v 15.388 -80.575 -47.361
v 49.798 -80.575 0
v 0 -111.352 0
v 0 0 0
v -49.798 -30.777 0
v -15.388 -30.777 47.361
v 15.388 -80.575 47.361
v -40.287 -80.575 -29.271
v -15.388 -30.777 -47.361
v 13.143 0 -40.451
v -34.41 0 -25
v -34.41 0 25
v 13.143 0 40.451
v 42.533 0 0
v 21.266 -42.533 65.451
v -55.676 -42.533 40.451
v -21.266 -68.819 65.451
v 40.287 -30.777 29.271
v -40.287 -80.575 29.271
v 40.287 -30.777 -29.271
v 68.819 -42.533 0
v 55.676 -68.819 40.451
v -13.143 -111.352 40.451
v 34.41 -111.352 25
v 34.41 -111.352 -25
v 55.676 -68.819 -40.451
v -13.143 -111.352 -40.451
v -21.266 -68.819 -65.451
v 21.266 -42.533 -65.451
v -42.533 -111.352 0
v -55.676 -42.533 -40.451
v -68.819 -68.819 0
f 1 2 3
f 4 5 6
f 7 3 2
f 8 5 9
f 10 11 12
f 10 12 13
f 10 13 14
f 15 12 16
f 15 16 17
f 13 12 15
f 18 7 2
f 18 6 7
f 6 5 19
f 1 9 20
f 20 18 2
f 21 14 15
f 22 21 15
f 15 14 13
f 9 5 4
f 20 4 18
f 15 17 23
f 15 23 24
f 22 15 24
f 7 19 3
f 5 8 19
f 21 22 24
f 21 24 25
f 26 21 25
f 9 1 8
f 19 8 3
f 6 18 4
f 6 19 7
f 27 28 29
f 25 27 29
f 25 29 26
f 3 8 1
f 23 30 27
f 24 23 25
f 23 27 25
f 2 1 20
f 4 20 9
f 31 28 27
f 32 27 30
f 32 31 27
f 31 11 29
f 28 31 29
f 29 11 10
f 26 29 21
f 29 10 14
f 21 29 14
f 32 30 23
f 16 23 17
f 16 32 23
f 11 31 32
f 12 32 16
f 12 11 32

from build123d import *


with BuildPart() as body_1:
    # Skizze1 → Oberfläche-Ebene1: a flat surface bounded by the sketch
    with BuildSketch(Plane(origin=(0, 0, 0), x_dir=(1, 0, 0), z_dir=(0, 1, 0)), mode=Mode.PRIVATE) as oberfl_che_ebene1_1_region:
        Polygon((42.532540418, 0), (13.143277803, 40.450849719), (-34.409548012, 25), (-34.409548012, -25), (13.143277803, -40.450849719), align=None)
    oberfl_che_ebene1_1 = oberfl_che_ebene1_1_region.sketch.faces()[0]
    # Skizze2 → Oberfläche-Ebene2: a flat surface bounded by the sketch
    with BuildSketch(Plane(origin=(22.270327288, 13.763819205, -16.180339887), x_dir=(0.447213595, 0.276393202, 0.850650808), z_dir=(-0.723606798, -0.447213595, 0.525731112)), mode=Mode.PRIVATE) as oberfl_che_ebene2_2_region:
        Polygon((19.021130326, -22.360679775), (-28.531695489, -6.909830056), (-57.920958103, -47.360679775), (-28.531695489, -87.811529494), (19.021130326, -72.360679775), align=None)
    oberfl_che_ebene2_2 = oberfl_che_ebene2_2_region.sketch.faces()[0]
    # Skizze3 → Oberfläche-Ebene3: a flat surface bounded by the sketch
    with BuildSketch(Plane(origin=(22.270327288, 13.763819205, 16.180339887), x_dir=(-0.447213595, -0.276393202, 0.850650808), z_dir=(-0.723606798, -0.447213595, -0.525731112)), mode=Mode.PRIVATE) as oberfl_che_ebene3_3_region:
        Polygon((-19.021130326, -22.360679775), (-19.021130326, -72.360679775), (28.531695489, -87.811529494), (57.920958103, -47.360679775), (28.531695489, -6.909830056), align=None)
    oberfl_che_ebene3_3 = oberfl_che_ebene3_3_region.sketch.faces()[0]
    # Skizze4 → Oberfläche-Ebene4: a flat surface bounded by the sketch
    with BuildSketch(Plane(origin=(-8.506508084, 13.763819205, 26.180339887), x_dir=(-0.961044639, -0.128617124, -0.244644308), z_dir=(0.276393202, -0.447213595, -0.850650808)), mode=Mode.PRIVATE) as oberfl_che_ebene4_4_region:
        Polygon((13.27697134, -91.370916552), (-30.979599792, -68.103860192), (-22.527346819, -18.823444004), (26.953003932, -11.63352818), (49.081289498, -56.470332012), align=None)
    oberfl_che_ebene4_4 = oberfl_che_ebene4_4_region.sketch.faces()[0]
    # Skizze5 → Oberfläche-Ebene5: a flat surface bounded by the sketch
    with BuildSketch(Plane(origin=(-27.527638409, 13.763819205, 0), x_dir=(0, 0, -1), z_dir=(0.894427191, -0.447213595, 0)), mode=Mode.PRIVATE) as oberfl_che_ebene5_5_region:
        Polygon((40.450849719, -62.941243501), (0, -92.330506115), (-40.450849719, -62.941243501), (-25, -15.388417686), (25, -15.388417686), align=None)
    oberfl_che_ebene5_5 = oberfl_che_ebene5_5_region.sketch.faces()[0]
    # Skizze6 → Oberfläche-Ebene6: a flat surface bounded by the sketch
    with BuildSketch(Plane(origin=(-8.506508084, 13.763819205, -26.180339887), x_dir=(0.961044639, 0.128617124, -0.244644308), z_dir=(0.276393202, -0.447213595, 0.850650808)), mode=Mode.PRIVATE) as oberfl_che_ebene6_6_region:
        Polygon((-26.953003932, -11.63352818), (-49.081289498, -56.470332012), (-13.27697134, -91.370916552), (30.979599792, -68.103860192), (22.527346819, -18.823444004), align=None)
    oberfl_che_ebene6_6 = oberfl_che_ebene6_6_region.sketch.faces()[0]
    # Skizze7 → Oberfläche-Ebene7: a flat surface bounded by the sketch
    with BuildSketch(Plane(origin=(22.270327288, -36.034146493, 68.541019662), x_dir=(-0.961044639, -0.128617124, 0.244644308), z_dir=(-0.276393202, 0.447213595, -0.850650808)), mode=Mode.PRIVATE) as oberfl_che_ebene7_7_region:
        Polygon((45.301327056, -30.456972184), (36.849074082, -79.737388372), (-12.631276669, -86.927304196), (-34.759562235, -42.090500364), (1.044755924, -7.189915824), align=None)
    oberfl_che_ebene7_7 = oberfl_che_ebene7_7_region.sketch.faces()[0]
    # Skizze8 → Oberfläche-Ebene8: a flat surface bounded by the sketch
    with BuildSketch(Plane(origin=(-58.304473781, -36.034146493, 42.360679775), x_dir=(-0.447213595, -0.276393202, -0.850650808), z_dir=(0.723606798, 0.447213595, -0.525731112)), mode=Mode.PRIVATE) as oberfl_che_ebene8_8_region:
        Polygon((49.797965698, -72.360679775), (2.245139883, -87.811529494), (-27.144122732, -47.360679775), (2.245139883, -6.909830056), (49.797965698, -22.360679775), align=None)
    oberfl_che_ebene8_8 = oberfl_che_ebene8_8_region.sketch.faces()[0]
    # Skizze9 → Oberfläche-Ebene9: a flat surface bounded by the sketch
    with BuildSketch(Plane(origin=(-58.304473781, -36.034146493, -42.360679775), x_dir=(0.447213595, 0.276393202, -0.850650808), z_dir=(0.723606798, 0.447213595, 0.525731112)), mode=Mode.PRIVATE) as oberfl_che_ebene9_9_region:
        Polygon((27.144122732, -47.360679775), (-2.245139883, -87.811529494), (-49.797965698, -72.360679775), (-49.797965698, -22.360679775), (-2.245139883, -6.909830056), align=None)
    oberfl_che_ebene9_9 = oberfl_che_ebene9_9_region.sketch.faces()[0]
    # Skizze10 → Oberfläche-Ebene10: a flat surface bounded by the sketch
    with BuildSketch(Plane(origin=(22.270327288, -36.034146493, -68.541019662), x_dir=(-0.961044639, -0.128617124, -0.244644308), z_dir=(0.276393202, -0.447213595, -0.850650808)), mode=Mode.PRIVATE) as oberfl_che_ebene10_10_region:
        Polygon((-12.631276669, -86.927304196), (-34.759562235, -42.090500364), (1.044755924, -7.189915824), (45.301327056, -30.456972184), (36.849074082, -79.737388372), align=None)
    oberfl_che_ebene10_10 = oberfl_che_ebene10_10_region.sketch.faces()[0]
    # Skizze11 → Oberfläche-Ebene11: a flat surface bounded by the sketch
    with BuildSketch(Plane(origin=(72.068292986, -36.034146493, 0), x_dir=(0, 0, -1), z_dir=(0.894427191, -0.447213595, 0)), mode=Mode.PRIVATE) as oberfl_che_ebene11_11_region:
        Polygon((-40.450849719, -36.654687895), (-25, -84.207513709), (25, -84.207513709), (40.450849719, -36.654687895), (0, -7.26542528), align=None)
    oberfl_che_ebene11_11 = oberfl_che_ebene11_11_region.sketch.faces()[0]
    # Skizze12 → Oberfläche-Ebene12: a flat surface bounded by the sketch
    with BuildSketch(Plane(origin=(0, -111.351636441, 0), x_dir=(1, 0, 0), z_dir=(0, 1, 0)), mode=Mode.PRIVATE) as oberfl_che_ebene12_12_region:
        Polygon((-13.143277803, -40.450849719), (34.409548012, -25), (34.409548012, 25), (-13.143277803, 40.450849719), (-42.532540418, 0), align=None)
    oberfl_che_ebene12_12 = oberfl_che_ebene12_12_region.sketch.faces()[0]
    # Oberfläche-Zusammenfügen1: the surfaces knitted into a closed skin and filled: a solid
    add(Solid(Shell(Face.sew_faces(oberfl_che_ebene1_1.faces() + oberfl_che_ebene2_2.faces() + oberfl_che_ebene3_3.faces() + oberfl_che_ebene4_4.faces() + oberfl_che_ebene5_5.faces() + oberfl_che_ebene6_6.faces() + oberfl_che_ebene7_7.faces() + oberfl_che_ebene8_8.faces() + oberfl_che_ebene9_9.faces() + oberfl_che_ebene10_10.faces() + oberfl_che_ebene11_11.faces() + oberfl_che_ebene12_12.faces())[0])))


with BuildPart() as body_2:
    # Skizze-y1 → Oberfläche-Ebene-y1: a flat surface bounded by the sketch
    with BuildSketch(Plane(origin=(0, 0, 0), x_dir=(0.982246946, -0.1517655, -0.11026409), z_dir=(0.187592474, 0.794654472, 0.577350269)), mode=Mode.PRIVATE) as oberfl_che_ebene_y1_13_region:
        Polygon((41.015551826, -41.770509831), (-15.66654673, -56.405764747), (0, 0), align=None)
    oberfl_che_ebene_y1_13 = oberfl_che_ebene_y1_13_region.sketch.faces()[0]
    # Skizze-y2 → Oberfläche-Ebene-y2: a flat surface bounded by the sketch
    with BuildSketch(Plane(origin=(0, 0, 0), x_dir=(0.871089969, 0.448028881, 0.201177502), z_dir=(-0.491123473, 0.794654472, 0.35682209)), mode=Mode.PRIVATE) as oberfl_che_ebene_y2_14_region:
        Polygon((-17.665704156, -55.811951048), (0, 0), (-57.167419521, -12.607026949), align=None)
    oberfl_che_ebene_y2_14 = oberfl_che_ebene_y2_14_region.sketch.faces()[0]
    # Skizze-y3 → Oberfläche-Ebene-y3: a flat surface bounded by the sketch
    with BuildSketch(Plane(origin=(0, 0, 0), x_dir=(0.871089969, 0.448028881, -0.201177502), z_dir=(-0.491123473, 0.794654472, -0.35682209)), mode=Mode.PRIVATE) as oberfl_che_ebene_y3_15_region:
        Polygon((-57.167419521, 12.607026949), (0, 0), (-17.665704156, 55.811951048), align=None)
    oberfl_che_ebene_y3_15 = oberfl_che_ebene_y3_15_region.sketch.faces()[0]
    # Skizze-y4 → Oberfläche-Ebene-y4: a flat surface bounded by the sketch
    with BuildSketch(Plane(origin=(0, 0, 0), x_dir=(0.982246946, -0.1517655, 0.11026409), z_dir=(0.187592474, 0.794654472, -0.577350269)), mode=Mode.PRIVATE) as oberfl_che_ebene_y4_16_region:
        Polygon((41.015551826, 41.770509831), (0, 0), (-15.66654673, 56.405764747), align=None)
    oberfl_che_ebene_y4_16 = oberfl_che_ebene_y4_16_region.sketch.faces()[0]
    # Skizze-y5 → Oberfläche-Ebene-y5: a flat surface bounded by the sketch
    with BuildSketch(Plane(origin=(0, 0, 0), x_dir=(0.794654472, -0.607061998, 0), z_dir=(0.607061998, 0.794654472, 0)), mode=Mode.PRIVATE) as oberfl_che_ebene_y5_17_region:
        Polygon((0, 0), (50.698010191, -29.270509831), (50.698010191, 29.270509831), align=None)
    oberfl_che_ebene_y5_17 = oberfl_che_ebene_y5_17_region.sketch.faces()[0]
    # Skizze-y6 → Oberfläche-Ebene-y6: a flat surface bounded by the sketch
    with BuildSketch(Plane(origin=(10.258945124, 6.340376775, 31.573786517), x_dir=(-0.952821564, 0.05975949, 0.297590105), z_dir=(-0.303530999, -0.187592474, -0.934172359)), mode=Mode.PRIVATE) as oberfl_che_ebene_y6_18_region:
        Polygon((-5.383455577, -88.322160488), (-31.515297879, -35.937259982), (26.917277885, -39.498870954), align=None)
    oberfl_che_ebene_y6_18 = oberfl_che_ebene_y6_18_region.sketch.faces()[0]
    # Skizze-y7 → Oberfläche-Ebene-y7: a flat surface bounded by the sketch
    with BuildSketch(Plane(origin=(-16.599321899, -10.258945124, 51.087459737), x_dir=(-0.952821564, 0.05975949, -0.297590105), z_dir=(0.303530999, 0.187592474, -0.934172359)), mode=Mode.PRIVATE) as oberfl_che_ebene_y7_19_region:
        Polygon((-33.571594932, -69.673323329), (-1.27086147, -20.850033795), (24.860980832, -73.234934301), align=None)
    oberfl_che_ebene_y7_19 = oberfl_che_ebene_y7_19_region.sketch.faces()[0]
    # Skizze-y8 → Oberfläche-Ebene-y8: a flat surface bounded by the sketch
    with BuildSketch(Plane(origin=(-26.858267023, 6.340376775, 19.513673221), x_dir=(0.561905566, -0.132647911, 0.816496581), z_dir=(-0.794654472, 0.187592474, 0.577350269)), mode=Mode.PRIVATE) as oberfl_che_ebene_y8_20_region:
        Polygon((11.9496356, -87.675491651), (34.105478461, -33.489057831), (-23.899271199, -41.394751981), align=None)
    oberfl_che_ebene_y8_20 = oberfl_che_ebene_y8_20_region.sketch.faces()[0]
    # Skizze-y9 → Oberfläche-Ebene-y9: a flat surface bounded by the sketch
    with BuildSketch(Plane(origin=(-53.716534046, -10.258945124, 0), x_dir=(0, 0, 1), z_dir=(-0.982246946, -0.187592474, 0)), mode=Mode.PRIVATE) as oberfl_che_ebene_y9_21_region:
        Polygon((-29.270509831, -71.586739165), (29.270509831, -71.586739165), (0, -20.888728973), align=None)
    oberfl_che_ebene_y9_21 = oberfl_che_ebene_y9_21_region.sketch.faces()[0]
    # Skizze-y10 → Oberfläche-Ebene-y10: a flat surface bounded by the sketch
    with BuildSketch(Plane(origin=(-26.858267023, 6.340376775, -19.513673221), x_dir=(0.561905566, -0.132647911, -0.816496581), z_dir=(0.794654472, -0.187592474, 0.577350269)), mode=Mode.PRIVATE) as oberfl_che_ebene_y10_22_region:
        Polygon((-23.899271199, -41.394751981), (11.9496356, -87.675491651), (34.105478461, -33.489057831), align=None)
    oberfl_che_ebene_y10_22 = oberfl_che_ebene_y10_22_region.sketch.faces()[0]
    # Skizze-y11 → Oberfläche-Ebene-y11: a flat surface bounded by the sketch
    with BuildSketch(Plane(origin=(-16.599321899, -10.258945124, -51.087459737), x_dir=(-0.952821564, 0.05975949, 0.297590105), z_dir=(-0.303530999, -0.187592474, -0.934172359)), mode=Mode.PRIVATE) as oberfl_che_ebene_y11_23_region:
        Polygon((-33.571594932, -69.673323329), (24.860980832, -73.234934301), (-1.27086147, -20.850033795), align=None)
    oberfl_che_ebene_y11_23 = oberfl_che_ebene_y11_23_region.sketch.faces()[0]
    # Skizze-y12 → Oberfläche-Ebene-y12: a flat surface bounded by the sketch
    with BuildSketch(Plane(origin=(10.258945124, 6.340376775, -31.573786517), x_dir=(0.952821564, -0.05975949, 0.297590105), z_dir=(-0.303530999, -0.187592474, 0.934172359)), mode=Mode.PRIVATE) as oberfl_che_ebene_y12_24_region:
        Polygon((-26.917277885, -39.498870954), (5.383455577, -88.322160488), (31.515297879, -35.937259982), align=None)
    oberfl_che_ebene_y12_24 = oberfl_che_ebene_y12_24_region.sketch.faces()[0]
    # Skizze-y13 → Oberfläche-Ebene-y13: a flat surface bounded by the sketch
    with BuildSketch(Plane(origin=(43.457588922, -10.258945124, -31.573786517), x_dir=(-0.561905566, 0.132647911, -0.816496581), z_dir=(0.794654472, -0.187592474, -0.577350269)), mode=Mode.PRIVATE) as oberfl_che_ebene_y13_25_region:
        Polygon((19.334916553, -74.883809811), (-38.669833107, -66.978115661), (-2.820926308, -20.69737599), align=None)
    oberfl_che_ebene_y13_25 = oberfl_che_ebene_y13_25_region.sketch.faces()[0]
    # Skizze-y14 → Oberfläche-Ebene-y14: a flat surface bounded by the sketch
    with BuildSketch(Plane(origin=(33.198643798, 6.340376775, 0), x_dir=(0, 0, 1), z_dir=(-0.982246946, -0.187592474, 0)), mode=Mode.PRIVATE) as oberfl_che_ebene_y14_26_region:
        Polygon((0, -88.486075895), (-29.270509831, -37.788065704), (29.270509831, -37.788065704), align=None)
    oberfl_che_ebene_y14_26 = oberfl_che_ebene_y14_26_region.sketch.faces()[0]
    # Skizze-y15 → Oberfläche-Ebene-y15: a flat surface bounded by the sketch
    with BuildSketch(Plane(origin=(43.457588922, -10.258945124, 31.573786517), x_dir=(-0.561905566, 0.132647911, 0.816496581), z_dir=(-0.794654472, 0.187592474, -0.577350269)), mode=Mode.PRIVATE) as oberfl_che_ebene_y15_27_region:
        Polygon((-38.669833107, -66.978115661), (-2.820926308, -20.69737599), (19.334916553, -74.883809811), align=None)
    oberfl_che_ebene_y15_27 = oberfl_che_ebene_y15_27_region.sketch.faces()[0]
    # Skizze-y16 → Oberfläche-Ebene-y16: a flat surface bounded by the sketch
    with BuildSketch(Plane(origin=(-16.599321899, -70.315855945, 51.087459737), x_dir=(0.982246946, -0.1517655, 0.11026409), z_dir=(0.187592474, 0.794654472, -0.577350269)), mode=Mode.PRIVATE) as oberfl_che_ebene_y16_28_region:
        Polygon((32.56588346, 9.045084972), (16.89933673, 65.450849719), (-24.116215095, 23.680339887), align=None)
    oberfl_che_ebene_y16_28 = oberfl_che_ebene_y16_28_region.sketch.faces()[0]
    # Skizze-y17 → Oberfläche-Ebene-y17: a flat surface bounded by the sketch
    with BuildSketch(Plane(origin=(-53.716534046, -70.315855945, 0), x_dir=(0.794654472, -0.607061998, 0), z_dir=(0.607061998, 0.794654472, 0)), mode=Mode.PRIVATE) as oberfl_che_ebene_y17_29_region:
        Polygon((16.89933673, -29.270509831), (67.597346922, 0), (16.89933673, 29.270509831), align=None)
    oberfl_che_ebene_y17_29 = oberfl_che_ebene_y17_29_region.sketch.faces()[0]
    # Skizze-y18 → Oberfläche-Ebene-y18: a flat surface bounded by the sketch
    with BuildSketch(Plane(origin=(-16.599321899, -70.315855945, -51.087459737), x_dir=(-0.982246946, 0.1517655, 0.11026409), z_dir=(-0.187592474, -0.794654472, -0.577350269)), mode=Mode.PRIVATE) as oberfl_che_ebene_y18_30_region:
        Polygon((24.116215095, -23.680339887), (-16.89933673, -65.450849719), (-32.56588346, -9.045084972), align=None)
    oberfl_che_ebene_y18_30 = oberfl_che_ebene_y18_30_region.sketch.faces()[0]
    # Skizze-y19 → Oberfläche-Ebene-y19: a flat surface bounded by the sketch
    with BuildSketch(Plane(origin=(43.457588922, -70.315855945, -31.573786517), x_dir=(-0.871089969, -0.448028881, -0.201177502), z_dir=(0.491123473, -0.794654472, -0.35682209)), mode=Mode.PRIVATE) as oberfl_che_ebene_y19_31_region:
        Polygon((49.888749118, -45.612651998), (32.223044962, 10.19929905), (-7.278670403, -33.005625049), align=None)
    oberfl_che_ebene_y19_31 = oberfl_che_ebene_y19_31_region.sketch.faces()[0]
    # Skizze-y20 → Oberfläche-Ebene-y20: a flat surface bounded by the sketch
    with BuildSketch(Plane(origin=(43.457588922, -70.315855945, 31.573786517), x_dir=(0.871089969, 0.448028881, -0.201177502), z_dir=(-0.491123473, 0.794654472, -0.35682209)), mode=Mode.PRIVATE) as oberfl_che_ebene_y20_32_region:
        Polygon((-32.223044962, -10.19929905), (7.278670403, 33.005625049), (-49.888749118, 45.612651998), align=None)
    oberfl_che_ebene_y20_32 = oberfl_che_ebene_y20_32_region.sketch.faces()[0]
    # Oberfläche-Zusammenfügen2: the surfaces knitted into a closed skin and filled: a solid
    add(Solid(Shell(Face.sew_faces(oberfl_che_ebene_y1_13.faces() + oberfl_che_ebene_y2_14.faces() + oberfl_che_ebene_y3_15.faces() + oberfl_che_ebene_y4_16.faces() + oberfl_che_ebene_y5_17.faces() + oberfl_che_ebene_y6_18.faces() + oberfl_che_ebene_y7_19.faces() + oberfl_che_ebene_y8_20.faces() + oberfl_che_ebene_y9_21.faces() + oberfl_che_ebene_y10_22.faces() + oberfl_che_ebene_y11_23.faces() + oberfl_che_ebene_y12_24.faces() + oberfl_che_ebene_y13_25.faces() + oberfl_che_ebene_y14_26.faces() + oberfl_che_ebene_y15_27.faces() + oberfl_che_ebene_y16_28.faces() + oberfl_che_ebene_y17_29.faces() + oberfl_che_ebene_y18_30.faces() + oberfl_che_ebene_y19_31.faces() + oberfl_che_ebene_y20_32.faces())[0])))


solid = Compound([body_1.part, body_2.part])
